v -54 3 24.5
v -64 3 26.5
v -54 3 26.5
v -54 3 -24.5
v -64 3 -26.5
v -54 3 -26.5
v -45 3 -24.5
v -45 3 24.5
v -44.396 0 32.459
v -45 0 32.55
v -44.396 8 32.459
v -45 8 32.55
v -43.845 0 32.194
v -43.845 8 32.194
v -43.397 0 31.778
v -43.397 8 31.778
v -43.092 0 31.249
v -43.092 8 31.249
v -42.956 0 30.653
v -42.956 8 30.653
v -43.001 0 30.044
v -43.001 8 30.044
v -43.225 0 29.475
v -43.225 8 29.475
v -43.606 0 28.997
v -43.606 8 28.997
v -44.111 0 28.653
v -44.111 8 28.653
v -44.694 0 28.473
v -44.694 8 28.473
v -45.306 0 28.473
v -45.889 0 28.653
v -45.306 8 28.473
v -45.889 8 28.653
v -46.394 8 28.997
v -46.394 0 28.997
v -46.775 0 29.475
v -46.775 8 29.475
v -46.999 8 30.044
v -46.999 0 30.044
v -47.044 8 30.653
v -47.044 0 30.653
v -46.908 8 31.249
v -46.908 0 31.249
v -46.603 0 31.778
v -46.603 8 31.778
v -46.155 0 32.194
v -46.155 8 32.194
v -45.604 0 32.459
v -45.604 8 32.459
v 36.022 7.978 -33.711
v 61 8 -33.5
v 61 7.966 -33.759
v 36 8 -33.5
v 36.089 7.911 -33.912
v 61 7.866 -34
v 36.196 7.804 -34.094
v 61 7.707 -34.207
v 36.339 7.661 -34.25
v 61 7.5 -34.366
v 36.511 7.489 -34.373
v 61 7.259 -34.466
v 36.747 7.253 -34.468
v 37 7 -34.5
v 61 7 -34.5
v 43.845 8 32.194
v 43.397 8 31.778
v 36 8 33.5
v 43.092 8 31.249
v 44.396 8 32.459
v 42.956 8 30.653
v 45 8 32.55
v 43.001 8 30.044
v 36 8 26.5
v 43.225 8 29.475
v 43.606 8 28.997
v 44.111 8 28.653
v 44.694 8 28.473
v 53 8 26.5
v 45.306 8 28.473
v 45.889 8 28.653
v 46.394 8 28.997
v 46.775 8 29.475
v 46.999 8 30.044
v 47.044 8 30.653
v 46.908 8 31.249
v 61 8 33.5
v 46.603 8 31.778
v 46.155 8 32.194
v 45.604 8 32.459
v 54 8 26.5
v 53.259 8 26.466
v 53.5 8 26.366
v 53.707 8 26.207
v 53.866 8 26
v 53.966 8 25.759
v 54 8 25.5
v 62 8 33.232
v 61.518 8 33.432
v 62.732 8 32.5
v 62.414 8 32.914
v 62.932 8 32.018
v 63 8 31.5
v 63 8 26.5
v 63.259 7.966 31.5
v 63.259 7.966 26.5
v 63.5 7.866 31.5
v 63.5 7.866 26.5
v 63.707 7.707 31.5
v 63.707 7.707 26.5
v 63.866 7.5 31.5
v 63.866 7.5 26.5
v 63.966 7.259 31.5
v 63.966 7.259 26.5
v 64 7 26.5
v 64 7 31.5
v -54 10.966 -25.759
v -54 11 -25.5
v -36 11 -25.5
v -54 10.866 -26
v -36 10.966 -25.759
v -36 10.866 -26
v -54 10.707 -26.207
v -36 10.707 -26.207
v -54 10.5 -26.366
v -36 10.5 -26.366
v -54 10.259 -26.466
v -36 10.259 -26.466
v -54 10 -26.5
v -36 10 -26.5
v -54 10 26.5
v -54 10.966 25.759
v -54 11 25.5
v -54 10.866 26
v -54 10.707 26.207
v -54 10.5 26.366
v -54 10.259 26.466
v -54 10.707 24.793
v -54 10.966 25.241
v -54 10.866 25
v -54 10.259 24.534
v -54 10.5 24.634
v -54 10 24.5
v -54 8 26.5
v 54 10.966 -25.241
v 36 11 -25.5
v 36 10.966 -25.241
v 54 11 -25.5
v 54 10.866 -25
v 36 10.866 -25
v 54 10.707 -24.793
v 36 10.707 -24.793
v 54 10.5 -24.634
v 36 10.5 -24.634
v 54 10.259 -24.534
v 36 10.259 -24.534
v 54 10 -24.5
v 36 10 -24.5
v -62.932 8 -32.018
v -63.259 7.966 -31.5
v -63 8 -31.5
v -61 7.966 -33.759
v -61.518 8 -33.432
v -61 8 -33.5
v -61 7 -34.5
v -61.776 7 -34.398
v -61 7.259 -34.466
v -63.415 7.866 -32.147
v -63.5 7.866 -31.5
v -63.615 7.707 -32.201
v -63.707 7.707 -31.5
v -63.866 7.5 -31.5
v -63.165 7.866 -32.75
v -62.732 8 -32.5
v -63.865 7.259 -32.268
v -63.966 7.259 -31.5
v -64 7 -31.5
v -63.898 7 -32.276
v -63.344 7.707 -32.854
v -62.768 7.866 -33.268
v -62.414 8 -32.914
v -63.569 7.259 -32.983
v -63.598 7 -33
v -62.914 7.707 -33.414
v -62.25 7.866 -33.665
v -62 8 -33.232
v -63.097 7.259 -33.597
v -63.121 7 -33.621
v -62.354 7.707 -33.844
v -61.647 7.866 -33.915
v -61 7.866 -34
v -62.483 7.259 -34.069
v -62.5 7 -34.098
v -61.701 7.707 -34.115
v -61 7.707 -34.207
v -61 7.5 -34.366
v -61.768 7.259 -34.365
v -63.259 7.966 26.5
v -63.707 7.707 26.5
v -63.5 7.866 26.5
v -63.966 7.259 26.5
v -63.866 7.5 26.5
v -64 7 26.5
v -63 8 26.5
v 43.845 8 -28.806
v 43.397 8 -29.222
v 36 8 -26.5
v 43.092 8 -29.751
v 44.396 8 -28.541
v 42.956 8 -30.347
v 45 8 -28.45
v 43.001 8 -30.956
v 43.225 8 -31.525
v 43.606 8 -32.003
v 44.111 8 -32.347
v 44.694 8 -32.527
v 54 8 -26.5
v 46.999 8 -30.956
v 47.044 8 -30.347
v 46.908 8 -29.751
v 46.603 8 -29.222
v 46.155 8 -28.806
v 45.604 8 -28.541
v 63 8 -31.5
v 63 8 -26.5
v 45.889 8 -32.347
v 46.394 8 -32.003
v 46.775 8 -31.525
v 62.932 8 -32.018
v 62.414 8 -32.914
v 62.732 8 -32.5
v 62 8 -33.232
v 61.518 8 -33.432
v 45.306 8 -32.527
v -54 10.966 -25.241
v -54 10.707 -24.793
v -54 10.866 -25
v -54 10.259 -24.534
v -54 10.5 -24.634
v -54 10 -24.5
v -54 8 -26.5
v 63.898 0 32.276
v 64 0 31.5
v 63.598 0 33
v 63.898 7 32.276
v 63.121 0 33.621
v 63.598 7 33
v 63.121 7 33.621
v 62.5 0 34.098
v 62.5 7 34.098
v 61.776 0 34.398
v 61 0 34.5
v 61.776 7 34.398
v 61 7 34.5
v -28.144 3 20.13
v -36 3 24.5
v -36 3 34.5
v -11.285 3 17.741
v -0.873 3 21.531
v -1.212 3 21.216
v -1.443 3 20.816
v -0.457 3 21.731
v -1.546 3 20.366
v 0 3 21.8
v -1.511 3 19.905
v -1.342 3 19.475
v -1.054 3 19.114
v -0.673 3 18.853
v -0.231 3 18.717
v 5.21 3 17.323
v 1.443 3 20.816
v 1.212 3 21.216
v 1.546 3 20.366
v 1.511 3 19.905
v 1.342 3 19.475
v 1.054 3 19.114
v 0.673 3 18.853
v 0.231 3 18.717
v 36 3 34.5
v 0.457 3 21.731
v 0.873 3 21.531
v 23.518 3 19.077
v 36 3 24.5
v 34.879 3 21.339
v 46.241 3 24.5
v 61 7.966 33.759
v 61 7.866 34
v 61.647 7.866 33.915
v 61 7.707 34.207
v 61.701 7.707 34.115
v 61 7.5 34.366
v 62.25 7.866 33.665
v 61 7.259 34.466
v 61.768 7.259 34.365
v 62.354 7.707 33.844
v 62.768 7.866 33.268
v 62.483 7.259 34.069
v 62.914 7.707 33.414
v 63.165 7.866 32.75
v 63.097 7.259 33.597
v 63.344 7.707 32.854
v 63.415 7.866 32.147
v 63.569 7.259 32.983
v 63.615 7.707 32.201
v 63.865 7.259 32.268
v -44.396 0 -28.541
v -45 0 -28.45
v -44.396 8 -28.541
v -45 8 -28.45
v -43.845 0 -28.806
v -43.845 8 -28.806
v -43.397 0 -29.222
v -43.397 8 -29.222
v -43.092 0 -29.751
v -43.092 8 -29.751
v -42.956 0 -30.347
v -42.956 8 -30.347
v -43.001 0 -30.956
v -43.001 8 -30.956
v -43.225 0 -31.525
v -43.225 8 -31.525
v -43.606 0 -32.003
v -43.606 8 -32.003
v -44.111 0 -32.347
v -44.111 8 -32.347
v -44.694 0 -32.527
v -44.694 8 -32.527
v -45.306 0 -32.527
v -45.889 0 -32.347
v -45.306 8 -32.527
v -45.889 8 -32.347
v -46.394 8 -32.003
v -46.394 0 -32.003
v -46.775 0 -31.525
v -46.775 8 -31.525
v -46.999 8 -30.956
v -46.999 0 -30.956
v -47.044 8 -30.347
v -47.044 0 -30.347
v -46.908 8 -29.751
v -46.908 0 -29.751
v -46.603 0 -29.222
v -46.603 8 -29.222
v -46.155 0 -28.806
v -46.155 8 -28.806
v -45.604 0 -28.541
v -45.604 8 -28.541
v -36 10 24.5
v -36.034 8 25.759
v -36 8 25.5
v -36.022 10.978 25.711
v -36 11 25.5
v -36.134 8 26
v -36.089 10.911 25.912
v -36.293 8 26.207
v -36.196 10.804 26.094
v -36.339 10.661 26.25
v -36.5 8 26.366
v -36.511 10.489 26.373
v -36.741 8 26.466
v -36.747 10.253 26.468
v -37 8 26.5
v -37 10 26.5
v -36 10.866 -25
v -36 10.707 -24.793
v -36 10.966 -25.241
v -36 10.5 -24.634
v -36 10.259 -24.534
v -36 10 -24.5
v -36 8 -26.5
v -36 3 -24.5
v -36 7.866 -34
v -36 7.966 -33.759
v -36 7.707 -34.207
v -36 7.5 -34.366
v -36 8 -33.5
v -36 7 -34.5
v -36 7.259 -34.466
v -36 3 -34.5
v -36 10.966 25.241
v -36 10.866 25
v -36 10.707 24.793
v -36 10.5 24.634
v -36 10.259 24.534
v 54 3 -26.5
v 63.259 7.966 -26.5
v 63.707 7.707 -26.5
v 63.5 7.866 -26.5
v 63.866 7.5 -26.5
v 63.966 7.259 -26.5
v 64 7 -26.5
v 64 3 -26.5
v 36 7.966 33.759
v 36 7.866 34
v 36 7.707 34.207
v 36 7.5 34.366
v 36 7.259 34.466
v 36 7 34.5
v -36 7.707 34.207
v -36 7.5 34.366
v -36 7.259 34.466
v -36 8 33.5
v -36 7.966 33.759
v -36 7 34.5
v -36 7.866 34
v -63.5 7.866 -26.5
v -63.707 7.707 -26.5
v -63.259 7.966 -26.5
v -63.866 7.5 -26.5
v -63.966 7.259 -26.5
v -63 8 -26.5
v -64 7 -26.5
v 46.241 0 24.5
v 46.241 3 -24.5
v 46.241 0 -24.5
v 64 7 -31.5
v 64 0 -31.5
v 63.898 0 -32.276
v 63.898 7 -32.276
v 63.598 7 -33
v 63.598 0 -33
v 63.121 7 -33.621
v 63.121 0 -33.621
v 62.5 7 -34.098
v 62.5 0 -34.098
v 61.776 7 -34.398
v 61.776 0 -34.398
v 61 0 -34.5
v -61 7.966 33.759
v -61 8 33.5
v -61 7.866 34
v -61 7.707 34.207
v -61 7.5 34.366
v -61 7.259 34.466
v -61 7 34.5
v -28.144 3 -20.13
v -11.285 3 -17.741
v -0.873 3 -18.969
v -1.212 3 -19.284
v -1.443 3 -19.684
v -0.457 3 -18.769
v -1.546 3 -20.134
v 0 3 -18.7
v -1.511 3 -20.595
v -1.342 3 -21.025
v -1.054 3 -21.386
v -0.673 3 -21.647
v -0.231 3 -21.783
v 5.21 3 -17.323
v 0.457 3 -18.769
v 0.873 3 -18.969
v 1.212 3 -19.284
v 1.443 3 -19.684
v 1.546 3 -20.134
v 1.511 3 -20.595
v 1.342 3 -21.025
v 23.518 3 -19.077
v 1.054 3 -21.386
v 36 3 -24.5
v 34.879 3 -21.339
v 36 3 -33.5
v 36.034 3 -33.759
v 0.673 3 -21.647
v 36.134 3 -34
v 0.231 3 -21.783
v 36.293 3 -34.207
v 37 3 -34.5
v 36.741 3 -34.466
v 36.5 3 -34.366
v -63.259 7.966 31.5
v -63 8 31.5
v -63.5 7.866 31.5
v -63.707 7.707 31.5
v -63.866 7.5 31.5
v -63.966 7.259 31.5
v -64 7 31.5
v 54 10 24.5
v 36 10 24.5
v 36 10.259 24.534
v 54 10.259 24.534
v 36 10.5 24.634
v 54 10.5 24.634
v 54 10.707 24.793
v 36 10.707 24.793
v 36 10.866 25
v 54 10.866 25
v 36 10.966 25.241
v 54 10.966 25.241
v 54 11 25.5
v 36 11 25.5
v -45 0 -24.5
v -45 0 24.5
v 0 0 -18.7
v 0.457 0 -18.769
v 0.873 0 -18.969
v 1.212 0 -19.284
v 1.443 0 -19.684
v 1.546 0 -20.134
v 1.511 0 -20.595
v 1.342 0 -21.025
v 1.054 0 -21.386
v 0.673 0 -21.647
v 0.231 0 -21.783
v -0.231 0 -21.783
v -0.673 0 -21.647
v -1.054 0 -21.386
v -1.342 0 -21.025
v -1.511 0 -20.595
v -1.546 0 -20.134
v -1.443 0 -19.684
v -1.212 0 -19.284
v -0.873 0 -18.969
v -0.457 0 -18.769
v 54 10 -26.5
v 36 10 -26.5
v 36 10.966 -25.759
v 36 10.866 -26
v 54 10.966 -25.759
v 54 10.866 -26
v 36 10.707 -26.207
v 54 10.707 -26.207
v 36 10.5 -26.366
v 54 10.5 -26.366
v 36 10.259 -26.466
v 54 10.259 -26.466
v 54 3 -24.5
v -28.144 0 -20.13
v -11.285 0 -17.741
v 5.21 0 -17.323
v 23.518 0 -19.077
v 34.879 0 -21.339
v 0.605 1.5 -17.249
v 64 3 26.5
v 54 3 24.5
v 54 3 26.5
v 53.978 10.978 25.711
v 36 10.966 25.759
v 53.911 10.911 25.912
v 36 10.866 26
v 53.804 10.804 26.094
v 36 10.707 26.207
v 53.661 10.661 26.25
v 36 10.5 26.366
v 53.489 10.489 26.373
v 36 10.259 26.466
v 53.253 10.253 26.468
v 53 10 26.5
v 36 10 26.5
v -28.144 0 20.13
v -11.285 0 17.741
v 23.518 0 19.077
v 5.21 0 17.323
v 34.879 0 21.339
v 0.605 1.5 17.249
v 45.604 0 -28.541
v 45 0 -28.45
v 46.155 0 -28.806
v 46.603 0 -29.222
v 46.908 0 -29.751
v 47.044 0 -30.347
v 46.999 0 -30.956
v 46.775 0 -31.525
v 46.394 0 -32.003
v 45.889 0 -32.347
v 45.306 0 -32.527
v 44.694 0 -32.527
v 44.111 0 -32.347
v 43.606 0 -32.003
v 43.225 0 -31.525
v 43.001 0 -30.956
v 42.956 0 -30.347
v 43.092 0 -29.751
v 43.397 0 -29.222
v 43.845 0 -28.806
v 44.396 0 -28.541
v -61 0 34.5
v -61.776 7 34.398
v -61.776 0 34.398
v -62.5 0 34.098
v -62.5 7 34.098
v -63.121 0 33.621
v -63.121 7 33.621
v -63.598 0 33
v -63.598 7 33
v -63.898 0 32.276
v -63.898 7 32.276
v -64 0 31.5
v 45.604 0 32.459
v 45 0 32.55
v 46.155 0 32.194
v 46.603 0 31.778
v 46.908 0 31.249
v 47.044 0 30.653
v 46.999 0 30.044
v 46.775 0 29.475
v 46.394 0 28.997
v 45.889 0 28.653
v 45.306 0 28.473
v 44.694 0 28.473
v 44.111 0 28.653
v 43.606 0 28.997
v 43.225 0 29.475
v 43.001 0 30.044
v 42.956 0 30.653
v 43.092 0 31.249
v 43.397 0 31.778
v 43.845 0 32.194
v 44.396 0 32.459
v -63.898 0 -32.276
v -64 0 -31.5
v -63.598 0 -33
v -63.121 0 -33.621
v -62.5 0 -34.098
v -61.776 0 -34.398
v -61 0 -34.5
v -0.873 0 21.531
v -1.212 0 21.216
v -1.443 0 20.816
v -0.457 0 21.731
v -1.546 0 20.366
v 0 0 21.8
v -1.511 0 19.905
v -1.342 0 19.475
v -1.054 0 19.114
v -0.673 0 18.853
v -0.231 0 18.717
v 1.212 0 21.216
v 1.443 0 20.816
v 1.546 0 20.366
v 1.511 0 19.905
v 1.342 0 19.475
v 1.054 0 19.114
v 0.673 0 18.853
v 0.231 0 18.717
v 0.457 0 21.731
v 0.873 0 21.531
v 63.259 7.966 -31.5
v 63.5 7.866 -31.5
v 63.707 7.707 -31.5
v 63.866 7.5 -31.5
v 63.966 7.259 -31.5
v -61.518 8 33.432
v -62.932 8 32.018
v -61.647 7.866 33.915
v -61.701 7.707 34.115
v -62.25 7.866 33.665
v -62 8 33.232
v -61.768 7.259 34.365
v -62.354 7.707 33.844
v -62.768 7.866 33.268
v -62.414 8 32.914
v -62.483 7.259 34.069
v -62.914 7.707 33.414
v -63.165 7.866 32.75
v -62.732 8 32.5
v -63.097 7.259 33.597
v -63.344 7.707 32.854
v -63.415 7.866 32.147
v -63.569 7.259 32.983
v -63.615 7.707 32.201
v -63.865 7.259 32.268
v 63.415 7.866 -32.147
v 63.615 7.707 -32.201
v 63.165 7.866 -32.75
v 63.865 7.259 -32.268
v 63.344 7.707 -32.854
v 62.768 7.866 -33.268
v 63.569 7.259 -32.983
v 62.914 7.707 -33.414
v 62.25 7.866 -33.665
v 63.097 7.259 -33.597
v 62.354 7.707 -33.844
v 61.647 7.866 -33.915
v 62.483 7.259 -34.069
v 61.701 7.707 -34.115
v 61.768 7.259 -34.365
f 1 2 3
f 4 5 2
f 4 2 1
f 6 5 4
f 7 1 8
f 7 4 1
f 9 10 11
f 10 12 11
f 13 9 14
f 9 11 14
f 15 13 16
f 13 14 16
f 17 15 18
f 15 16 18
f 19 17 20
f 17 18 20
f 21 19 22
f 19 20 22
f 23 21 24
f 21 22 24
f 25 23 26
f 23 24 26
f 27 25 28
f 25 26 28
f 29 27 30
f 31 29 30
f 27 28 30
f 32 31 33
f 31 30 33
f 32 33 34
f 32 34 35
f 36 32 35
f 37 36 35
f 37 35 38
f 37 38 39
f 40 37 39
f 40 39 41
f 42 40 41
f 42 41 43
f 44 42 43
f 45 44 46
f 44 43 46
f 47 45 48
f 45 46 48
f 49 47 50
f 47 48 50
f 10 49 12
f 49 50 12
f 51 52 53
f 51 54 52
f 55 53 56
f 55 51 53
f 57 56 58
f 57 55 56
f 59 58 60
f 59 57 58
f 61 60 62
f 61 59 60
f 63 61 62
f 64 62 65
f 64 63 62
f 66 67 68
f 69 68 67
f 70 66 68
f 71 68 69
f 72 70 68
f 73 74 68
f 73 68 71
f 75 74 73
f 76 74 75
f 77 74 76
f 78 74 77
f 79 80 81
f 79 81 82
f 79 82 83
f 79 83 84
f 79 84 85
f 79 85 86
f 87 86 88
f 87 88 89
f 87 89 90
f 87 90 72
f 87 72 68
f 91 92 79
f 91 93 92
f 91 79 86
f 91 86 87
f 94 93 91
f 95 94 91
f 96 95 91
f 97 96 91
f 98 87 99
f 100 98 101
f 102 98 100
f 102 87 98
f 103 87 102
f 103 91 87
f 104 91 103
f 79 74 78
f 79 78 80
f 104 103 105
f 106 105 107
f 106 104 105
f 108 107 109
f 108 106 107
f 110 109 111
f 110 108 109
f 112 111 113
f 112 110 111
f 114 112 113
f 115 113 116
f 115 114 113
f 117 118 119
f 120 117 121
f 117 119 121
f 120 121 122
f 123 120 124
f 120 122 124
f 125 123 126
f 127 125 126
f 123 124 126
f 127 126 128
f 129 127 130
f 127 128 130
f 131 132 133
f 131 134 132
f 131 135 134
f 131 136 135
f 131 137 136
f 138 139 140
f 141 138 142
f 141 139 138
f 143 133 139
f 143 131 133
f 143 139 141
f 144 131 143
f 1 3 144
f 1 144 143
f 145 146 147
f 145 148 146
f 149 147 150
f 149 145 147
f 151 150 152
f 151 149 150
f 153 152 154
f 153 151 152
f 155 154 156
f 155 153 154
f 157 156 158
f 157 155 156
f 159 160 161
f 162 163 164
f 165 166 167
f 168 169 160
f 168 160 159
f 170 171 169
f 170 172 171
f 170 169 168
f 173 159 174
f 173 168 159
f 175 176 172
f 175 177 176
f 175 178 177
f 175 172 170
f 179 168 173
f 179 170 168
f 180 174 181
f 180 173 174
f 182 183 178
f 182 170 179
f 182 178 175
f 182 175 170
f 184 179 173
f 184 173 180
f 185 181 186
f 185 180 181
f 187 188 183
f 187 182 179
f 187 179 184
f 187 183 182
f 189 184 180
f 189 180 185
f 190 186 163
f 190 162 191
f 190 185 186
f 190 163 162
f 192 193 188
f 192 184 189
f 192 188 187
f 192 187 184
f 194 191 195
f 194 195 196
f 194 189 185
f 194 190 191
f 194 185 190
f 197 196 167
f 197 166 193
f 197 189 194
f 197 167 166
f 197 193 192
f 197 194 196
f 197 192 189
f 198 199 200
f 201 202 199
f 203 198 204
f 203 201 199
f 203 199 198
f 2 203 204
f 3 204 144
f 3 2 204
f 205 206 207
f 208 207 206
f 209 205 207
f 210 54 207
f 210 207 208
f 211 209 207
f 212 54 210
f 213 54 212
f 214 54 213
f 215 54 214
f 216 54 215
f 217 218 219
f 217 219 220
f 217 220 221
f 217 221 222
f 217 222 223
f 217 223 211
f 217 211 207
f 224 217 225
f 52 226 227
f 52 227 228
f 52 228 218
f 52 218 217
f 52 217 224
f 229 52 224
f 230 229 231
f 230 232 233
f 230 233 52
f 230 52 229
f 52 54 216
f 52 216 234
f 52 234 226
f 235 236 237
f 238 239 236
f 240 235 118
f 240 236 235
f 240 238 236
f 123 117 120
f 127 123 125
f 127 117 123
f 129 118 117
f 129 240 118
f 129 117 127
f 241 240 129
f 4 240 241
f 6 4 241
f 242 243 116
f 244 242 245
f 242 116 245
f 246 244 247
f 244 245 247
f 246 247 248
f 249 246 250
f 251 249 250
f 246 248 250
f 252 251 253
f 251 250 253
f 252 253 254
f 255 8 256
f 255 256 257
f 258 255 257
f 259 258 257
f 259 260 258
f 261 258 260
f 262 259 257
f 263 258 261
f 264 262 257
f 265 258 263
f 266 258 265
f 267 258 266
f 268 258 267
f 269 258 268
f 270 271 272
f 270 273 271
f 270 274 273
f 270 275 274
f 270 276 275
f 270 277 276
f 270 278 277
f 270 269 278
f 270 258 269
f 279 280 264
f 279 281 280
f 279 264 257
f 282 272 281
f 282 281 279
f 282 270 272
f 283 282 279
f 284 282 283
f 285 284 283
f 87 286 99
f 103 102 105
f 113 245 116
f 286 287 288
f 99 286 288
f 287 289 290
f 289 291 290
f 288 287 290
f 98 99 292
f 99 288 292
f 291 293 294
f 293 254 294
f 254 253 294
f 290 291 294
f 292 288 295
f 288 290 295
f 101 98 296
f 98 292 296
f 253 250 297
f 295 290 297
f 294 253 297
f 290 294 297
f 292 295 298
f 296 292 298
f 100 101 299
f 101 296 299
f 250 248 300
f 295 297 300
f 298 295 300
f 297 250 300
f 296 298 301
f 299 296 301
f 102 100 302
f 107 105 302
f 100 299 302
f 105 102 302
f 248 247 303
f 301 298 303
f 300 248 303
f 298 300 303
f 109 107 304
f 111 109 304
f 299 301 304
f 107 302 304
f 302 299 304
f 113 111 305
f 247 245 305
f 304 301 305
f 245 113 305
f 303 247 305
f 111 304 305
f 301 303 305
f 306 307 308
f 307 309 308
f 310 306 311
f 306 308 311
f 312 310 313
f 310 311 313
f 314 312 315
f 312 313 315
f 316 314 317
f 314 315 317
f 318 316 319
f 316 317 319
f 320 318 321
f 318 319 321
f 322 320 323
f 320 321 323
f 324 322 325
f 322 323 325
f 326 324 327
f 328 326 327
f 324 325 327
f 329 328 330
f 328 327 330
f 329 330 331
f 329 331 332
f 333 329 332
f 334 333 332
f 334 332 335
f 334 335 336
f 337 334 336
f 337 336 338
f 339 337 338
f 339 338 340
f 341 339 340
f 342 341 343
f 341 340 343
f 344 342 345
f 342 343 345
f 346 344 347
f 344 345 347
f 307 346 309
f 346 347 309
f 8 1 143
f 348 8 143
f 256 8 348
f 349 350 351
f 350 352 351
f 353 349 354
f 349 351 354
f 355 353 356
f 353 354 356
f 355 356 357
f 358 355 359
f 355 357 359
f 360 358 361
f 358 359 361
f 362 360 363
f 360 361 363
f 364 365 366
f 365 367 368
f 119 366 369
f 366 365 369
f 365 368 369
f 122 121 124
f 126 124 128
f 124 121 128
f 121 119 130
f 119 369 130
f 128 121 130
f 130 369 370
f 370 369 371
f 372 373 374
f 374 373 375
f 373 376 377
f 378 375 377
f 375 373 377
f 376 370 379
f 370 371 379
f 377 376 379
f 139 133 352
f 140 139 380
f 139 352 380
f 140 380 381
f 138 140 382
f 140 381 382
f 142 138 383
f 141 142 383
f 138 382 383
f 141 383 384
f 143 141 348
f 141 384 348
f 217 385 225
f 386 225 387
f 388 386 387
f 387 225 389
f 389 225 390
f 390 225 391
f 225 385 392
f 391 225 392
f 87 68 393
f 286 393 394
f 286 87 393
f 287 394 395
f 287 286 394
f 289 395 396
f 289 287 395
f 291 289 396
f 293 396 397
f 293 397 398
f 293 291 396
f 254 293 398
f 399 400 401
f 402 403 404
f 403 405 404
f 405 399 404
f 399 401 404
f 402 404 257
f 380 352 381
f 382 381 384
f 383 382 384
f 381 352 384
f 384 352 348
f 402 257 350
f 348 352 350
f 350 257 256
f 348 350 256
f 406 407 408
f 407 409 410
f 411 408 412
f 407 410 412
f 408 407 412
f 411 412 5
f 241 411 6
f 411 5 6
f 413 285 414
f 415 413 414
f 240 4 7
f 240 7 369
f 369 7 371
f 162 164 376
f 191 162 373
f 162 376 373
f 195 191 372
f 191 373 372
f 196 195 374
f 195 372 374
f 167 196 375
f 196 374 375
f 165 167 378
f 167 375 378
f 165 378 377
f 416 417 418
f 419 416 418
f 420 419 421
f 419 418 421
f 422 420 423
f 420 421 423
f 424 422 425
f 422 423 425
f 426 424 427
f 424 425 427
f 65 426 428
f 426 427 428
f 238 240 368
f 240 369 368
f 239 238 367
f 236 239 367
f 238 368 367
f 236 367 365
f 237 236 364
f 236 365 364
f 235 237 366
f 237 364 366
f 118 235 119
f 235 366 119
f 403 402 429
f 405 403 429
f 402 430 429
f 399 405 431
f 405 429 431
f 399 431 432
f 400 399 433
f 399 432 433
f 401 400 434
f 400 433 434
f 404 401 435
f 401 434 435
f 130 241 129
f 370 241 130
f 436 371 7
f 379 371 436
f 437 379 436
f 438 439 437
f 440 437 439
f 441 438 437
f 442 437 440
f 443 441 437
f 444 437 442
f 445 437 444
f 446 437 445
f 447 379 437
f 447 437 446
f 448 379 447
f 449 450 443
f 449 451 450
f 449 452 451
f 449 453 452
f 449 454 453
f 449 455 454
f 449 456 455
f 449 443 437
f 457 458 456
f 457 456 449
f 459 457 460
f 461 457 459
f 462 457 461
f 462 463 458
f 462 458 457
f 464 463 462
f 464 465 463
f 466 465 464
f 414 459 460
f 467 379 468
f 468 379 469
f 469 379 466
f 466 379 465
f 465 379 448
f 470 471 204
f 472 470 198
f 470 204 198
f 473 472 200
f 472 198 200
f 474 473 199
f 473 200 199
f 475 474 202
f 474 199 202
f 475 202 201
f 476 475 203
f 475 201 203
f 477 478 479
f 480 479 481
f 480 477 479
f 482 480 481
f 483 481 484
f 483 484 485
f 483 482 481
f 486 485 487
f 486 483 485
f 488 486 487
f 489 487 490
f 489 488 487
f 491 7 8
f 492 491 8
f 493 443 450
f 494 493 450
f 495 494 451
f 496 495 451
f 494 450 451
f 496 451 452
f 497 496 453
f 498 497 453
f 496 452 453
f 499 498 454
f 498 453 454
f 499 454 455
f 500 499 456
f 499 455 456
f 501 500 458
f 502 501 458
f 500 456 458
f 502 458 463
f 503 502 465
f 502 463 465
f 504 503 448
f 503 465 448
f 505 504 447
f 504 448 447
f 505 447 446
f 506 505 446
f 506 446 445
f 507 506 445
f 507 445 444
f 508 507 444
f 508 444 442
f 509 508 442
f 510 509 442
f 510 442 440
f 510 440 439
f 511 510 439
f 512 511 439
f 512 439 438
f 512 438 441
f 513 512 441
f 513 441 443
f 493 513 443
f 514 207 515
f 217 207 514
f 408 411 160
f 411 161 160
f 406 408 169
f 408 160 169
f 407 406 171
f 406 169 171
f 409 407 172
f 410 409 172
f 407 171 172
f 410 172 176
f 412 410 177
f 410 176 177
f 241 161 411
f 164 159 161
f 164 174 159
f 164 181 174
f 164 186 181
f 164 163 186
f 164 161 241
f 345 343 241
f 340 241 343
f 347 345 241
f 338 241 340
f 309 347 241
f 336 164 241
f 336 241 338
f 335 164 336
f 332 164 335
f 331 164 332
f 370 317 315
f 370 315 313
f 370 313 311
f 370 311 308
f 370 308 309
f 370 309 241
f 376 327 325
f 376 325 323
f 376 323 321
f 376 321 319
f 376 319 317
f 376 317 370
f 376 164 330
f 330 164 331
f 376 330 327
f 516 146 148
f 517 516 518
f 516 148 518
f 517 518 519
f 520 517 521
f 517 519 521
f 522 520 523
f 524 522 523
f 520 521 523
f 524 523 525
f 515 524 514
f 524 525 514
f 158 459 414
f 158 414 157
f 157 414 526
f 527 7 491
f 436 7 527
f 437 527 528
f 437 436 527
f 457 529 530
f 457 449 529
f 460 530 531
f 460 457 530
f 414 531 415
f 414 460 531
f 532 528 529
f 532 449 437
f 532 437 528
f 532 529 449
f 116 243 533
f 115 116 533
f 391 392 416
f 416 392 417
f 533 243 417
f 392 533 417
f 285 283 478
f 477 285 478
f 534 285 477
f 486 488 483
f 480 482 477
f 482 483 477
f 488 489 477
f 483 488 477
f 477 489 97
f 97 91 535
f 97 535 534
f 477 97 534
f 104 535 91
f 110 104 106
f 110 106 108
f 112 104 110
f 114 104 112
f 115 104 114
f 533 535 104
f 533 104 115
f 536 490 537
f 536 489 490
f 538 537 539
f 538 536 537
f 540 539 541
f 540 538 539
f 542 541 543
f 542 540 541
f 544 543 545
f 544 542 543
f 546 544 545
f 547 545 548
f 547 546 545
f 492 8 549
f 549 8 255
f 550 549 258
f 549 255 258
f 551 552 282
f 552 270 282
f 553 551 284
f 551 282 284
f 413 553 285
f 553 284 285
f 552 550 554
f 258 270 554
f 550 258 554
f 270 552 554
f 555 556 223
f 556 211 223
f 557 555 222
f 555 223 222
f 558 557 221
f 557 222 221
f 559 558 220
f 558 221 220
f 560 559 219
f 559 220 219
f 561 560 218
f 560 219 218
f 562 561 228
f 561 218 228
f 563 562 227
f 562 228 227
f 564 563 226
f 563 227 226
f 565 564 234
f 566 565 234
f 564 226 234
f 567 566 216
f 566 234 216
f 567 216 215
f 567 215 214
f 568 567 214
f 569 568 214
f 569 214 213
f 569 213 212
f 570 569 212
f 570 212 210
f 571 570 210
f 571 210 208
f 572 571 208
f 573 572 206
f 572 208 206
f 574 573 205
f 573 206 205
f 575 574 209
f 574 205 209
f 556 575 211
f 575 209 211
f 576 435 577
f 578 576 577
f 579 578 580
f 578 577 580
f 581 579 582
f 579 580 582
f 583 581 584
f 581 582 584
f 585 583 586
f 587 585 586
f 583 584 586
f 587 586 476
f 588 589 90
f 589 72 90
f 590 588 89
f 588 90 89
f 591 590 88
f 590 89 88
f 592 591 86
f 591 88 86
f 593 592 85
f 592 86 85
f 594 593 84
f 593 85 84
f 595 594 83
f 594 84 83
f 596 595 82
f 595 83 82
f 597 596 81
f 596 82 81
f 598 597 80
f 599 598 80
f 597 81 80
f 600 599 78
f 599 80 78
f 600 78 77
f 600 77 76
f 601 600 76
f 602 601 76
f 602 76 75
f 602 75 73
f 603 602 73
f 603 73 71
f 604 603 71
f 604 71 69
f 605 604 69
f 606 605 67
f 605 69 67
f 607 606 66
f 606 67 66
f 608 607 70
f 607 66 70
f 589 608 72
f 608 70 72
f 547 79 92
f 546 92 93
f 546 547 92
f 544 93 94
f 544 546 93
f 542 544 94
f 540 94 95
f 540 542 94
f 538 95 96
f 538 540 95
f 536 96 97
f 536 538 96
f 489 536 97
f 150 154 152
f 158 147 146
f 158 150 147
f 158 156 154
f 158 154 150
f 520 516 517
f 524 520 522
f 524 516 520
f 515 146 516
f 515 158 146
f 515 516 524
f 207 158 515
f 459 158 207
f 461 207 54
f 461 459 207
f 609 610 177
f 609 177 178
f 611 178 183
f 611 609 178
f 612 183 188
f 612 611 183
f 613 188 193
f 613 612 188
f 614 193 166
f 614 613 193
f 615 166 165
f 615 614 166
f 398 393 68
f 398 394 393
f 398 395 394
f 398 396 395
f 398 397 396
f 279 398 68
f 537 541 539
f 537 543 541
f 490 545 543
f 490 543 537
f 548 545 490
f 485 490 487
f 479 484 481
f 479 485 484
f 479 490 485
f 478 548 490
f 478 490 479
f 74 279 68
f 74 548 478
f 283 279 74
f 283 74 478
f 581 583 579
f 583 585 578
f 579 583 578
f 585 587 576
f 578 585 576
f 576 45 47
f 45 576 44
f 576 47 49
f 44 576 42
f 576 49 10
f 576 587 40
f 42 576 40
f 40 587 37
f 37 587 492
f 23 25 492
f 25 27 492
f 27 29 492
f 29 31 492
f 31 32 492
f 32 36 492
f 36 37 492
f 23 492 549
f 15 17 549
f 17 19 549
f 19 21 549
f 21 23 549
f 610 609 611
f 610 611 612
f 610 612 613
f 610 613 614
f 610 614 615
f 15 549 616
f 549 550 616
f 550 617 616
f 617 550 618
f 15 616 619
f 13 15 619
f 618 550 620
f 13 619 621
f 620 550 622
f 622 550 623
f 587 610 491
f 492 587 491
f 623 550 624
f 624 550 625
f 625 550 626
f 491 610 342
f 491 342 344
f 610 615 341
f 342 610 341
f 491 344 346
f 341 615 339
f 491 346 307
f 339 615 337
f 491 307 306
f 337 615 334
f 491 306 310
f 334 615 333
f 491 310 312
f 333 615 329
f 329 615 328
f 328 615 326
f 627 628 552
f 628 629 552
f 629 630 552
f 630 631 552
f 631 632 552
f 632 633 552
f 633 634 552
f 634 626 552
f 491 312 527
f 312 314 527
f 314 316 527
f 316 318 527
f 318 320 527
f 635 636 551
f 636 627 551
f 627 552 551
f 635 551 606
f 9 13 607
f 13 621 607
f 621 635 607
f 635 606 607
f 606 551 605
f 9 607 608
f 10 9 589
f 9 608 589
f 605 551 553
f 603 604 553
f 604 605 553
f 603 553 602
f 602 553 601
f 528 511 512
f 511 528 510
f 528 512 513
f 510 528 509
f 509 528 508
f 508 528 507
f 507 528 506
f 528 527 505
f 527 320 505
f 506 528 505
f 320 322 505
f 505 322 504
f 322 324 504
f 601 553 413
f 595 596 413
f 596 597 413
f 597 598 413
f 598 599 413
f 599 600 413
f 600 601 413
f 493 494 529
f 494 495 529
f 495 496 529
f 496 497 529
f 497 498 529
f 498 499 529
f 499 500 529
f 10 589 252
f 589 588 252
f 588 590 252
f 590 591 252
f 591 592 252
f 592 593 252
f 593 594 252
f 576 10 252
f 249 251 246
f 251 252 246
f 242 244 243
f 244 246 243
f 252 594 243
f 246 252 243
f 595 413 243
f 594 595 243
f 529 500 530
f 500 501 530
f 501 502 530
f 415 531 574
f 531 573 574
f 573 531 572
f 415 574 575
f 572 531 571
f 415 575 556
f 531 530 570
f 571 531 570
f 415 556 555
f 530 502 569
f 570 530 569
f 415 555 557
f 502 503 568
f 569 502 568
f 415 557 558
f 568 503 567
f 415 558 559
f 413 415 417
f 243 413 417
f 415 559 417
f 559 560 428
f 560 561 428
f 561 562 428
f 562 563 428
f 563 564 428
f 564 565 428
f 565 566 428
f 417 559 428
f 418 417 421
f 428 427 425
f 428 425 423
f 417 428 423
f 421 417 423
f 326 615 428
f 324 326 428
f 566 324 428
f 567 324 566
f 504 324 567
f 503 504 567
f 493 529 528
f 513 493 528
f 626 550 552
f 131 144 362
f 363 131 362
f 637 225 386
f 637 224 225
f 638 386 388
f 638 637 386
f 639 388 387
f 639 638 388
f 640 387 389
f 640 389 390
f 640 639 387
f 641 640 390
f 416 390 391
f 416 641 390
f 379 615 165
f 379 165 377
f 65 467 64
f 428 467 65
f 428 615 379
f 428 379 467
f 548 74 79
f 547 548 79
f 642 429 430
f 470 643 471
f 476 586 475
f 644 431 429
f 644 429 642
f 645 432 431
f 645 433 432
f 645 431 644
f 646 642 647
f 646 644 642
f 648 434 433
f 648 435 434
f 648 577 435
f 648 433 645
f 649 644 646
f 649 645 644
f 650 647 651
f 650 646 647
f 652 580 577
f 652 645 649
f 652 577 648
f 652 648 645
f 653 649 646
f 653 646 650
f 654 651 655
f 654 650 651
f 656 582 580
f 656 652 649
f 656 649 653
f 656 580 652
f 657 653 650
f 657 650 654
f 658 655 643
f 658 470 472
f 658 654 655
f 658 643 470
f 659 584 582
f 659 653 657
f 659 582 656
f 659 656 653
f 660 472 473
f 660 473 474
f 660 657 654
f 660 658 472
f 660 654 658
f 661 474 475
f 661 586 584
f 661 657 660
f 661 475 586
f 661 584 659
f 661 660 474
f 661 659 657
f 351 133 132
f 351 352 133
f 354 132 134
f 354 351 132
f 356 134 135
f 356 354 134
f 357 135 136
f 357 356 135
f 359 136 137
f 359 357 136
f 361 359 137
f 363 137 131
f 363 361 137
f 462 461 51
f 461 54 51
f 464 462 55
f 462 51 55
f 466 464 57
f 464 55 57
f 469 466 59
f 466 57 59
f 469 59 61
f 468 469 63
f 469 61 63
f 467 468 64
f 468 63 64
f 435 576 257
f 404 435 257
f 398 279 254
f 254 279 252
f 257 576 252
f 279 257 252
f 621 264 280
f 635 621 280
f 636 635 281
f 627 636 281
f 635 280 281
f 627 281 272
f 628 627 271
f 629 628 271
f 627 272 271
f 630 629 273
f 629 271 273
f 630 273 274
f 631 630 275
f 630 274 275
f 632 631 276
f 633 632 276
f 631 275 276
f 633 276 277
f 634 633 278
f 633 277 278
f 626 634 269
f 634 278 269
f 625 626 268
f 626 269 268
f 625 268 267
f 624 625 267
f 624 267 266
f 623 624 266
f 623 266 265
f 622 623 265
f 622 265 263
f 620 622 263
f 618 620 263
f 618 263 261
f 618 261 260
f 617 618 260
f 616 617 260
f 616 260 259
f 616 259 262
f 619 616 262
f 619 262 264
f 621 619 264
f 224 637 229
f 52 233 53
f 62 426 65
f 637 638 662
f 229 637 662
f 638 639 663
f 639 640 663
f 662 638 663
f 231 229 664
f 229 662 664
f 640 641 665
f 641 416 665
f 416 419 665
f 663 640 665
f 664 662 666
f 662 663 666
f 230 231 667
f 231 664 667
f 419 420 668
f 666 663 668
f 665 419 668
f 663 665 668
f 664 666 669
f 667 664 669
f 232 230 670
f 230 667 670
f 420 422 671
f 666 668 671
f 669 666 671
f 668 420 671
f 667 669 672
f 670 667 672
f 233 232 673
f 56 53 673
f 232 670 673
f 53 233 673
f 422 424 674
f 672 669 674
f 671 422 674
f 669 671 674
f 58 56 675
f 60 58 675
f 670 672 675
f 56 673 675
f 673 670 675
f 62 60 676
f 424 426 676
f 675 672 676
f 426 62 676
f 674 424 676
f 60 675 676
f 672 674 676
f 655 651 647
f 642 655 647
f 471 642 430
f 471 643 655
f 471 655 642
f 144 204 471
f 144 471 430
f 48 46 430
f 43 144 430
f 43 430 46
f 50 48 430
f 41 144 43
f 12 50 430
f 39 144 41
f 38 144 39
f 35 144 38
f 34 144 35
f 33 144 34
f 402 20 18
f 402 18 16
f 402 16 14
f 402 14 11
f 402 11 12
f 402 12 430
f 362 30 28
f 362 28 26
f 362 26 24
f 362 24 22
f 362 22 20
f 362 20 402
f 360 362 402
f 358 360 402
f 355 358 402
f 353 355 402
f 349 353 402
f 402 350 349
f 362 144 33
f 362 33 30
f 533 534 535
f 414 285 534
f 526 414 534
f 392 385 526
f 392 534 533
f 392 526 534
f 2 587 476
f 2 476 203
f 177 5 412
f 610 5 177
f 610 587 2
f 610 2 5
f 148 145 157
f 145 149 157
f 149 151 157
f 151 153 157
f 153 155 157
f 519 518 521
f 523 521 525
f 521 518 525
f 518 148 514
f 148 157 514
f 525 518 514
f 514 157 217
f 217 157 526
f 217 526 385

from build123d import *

# Parameters (mm, degrees)
SKETCH1_W                      = 128
SKETCH1_H                      = 69
BOSS_EXTRUDE1_DEPTH            = 3
SKETCH5_R                      = 1.55
CUT_EXTRUDE5_DEPTH             = 10
SKETCH7_W                      = 28
SKETCH7_H                      = 8
BOSS_EXTRUDE2_DEPTH            = 5
SKETCH2_R                      = 2.05
CUT_EXTRUDE6_DEPTH             = 73.878323252
CUT_EXTRUDE6_DIRECTION_2_REACH = 74.878
CUT_EXTRUDE7_DEPTH             = 3
SKETCH8_W                      = 18
SKETCH8_H                      = 2
BOSS_EXTRUDE3_DEPTH            = 8
FILLET1_R                      = 3
FILLET2_R                      = 1


with BuildPart() as part:
    # Sketch1 → Boss-Extrude1 (new body)
    with BuildSketch(Plane(origin=(0, 0, 0), x_dir=(1, 0, 0), z_dir=(0, 1, 0))):
        Rectangle(SKETCH1_W, SKETCH1_H)
    extrude(amount=BOSS_EXTRUDE1_DEPTH)

    # Sketch5 → Cut-Extrude5 (cut)
    with BuildSketch(Plane(origin=(0, 3, 0), x_dir=(1, 0, 0), z_dir=(0, 1, 0))):
        with Locations(Location((0, -20.25, 0), (0, 0, 270))):
            Circle(SKETCH5_R)
        with Locations(Location((0, 20.25, 0), (0, 0, 270))):
            Circle(SKETCH5_R)
    extrude(amount=-CUT_EXTRUDE5_DEPTH, mode=Mode.SUBTRACT)

    # Sketch7 → Boss-Extrude2 (add)
    with BuildSketch(Plane(origin=(0, 3, 0), x_dir=(1, 0, 0), z_dir=(0, 1, 0))):
        with Locations((-50, 30.5)):
            Rectangle(SKETCH7_W, SKETCH7_H)
        with Locations((50, 30.5)):
            Rectangle(SKETCH7_W, SKETCH7_H)
        with Locations((50, -30.5)):
            Rectangle(SKETCH7_W, SKETCH7_H)
        with Locations((-50, -30.5)):
            Rectangle(SKETCH7_W, SKETCH7_H)
    extrude(amount=BOSS_EXTRUDE2_DEPTH)

    # Sketch2 → Cut-Extrude6 (cut)
    with BuildSketch(Plane(origin=(0, 3, 0), x_dir=(1, 0, 0), z_dir=(0, 1, 0))):
        with Locations(Location((-45, 30.5, 0), (0, 0, 270))):
            Circle(SKETCH2_R)
        with Locations(Location((45, 30.5, 0), (0, 0, 270))):
            Circle(SKETCH2_R)
        with Locations(Location((45, -30.5, 0), (0, 0, 270))):
            Circle(SKETCH2_R)
        with Locations(Location((-45, -30.5, 0), (0, 0, 270))):
            Circle(SKETCH2_R)
    extrude(amount=-CUT_EXTRUDE6_DEPTH, mode=Mode.SUBTRACT)

    # Sketch2 → Cut-Extrude6 direction 2 (cut, up to next)
    with BuildSketch(Plane(origin=(0, 3, 0), x_dir=(1, 0, 0), z_dir=(0, 1, 0)), mode=Mode.PRIVATE) as cut_extrude6_direction_2_sk1:
        with Locations(Location((-45, 30.5, 0), (0, 0, 270))):
            Circle(SKETCH2_R)
    cut_extrude6_direction_2_tool1 = extrude(cut_extrude6_direction_2_sk1.sketch, amount=CUT_EXTRUDE6_DIRECTION_2_REACH, mode=Mode.PRIVATE) & part.part
    # Sketch2 → Cut-Extrude6 direction 2 (cut, up to next)
    with BuildSketch(Plane(origin=(0, 3, 0), x_dir=(1, 0, 0), z_dir=(0, 1, 0)), mode=Mode.PRIVATE) as cut_extrude6_direction_2_sk2:
        with Locations(Location((45, 30.5, 0), (0, 0, 270))):
            Circle(SKETCH2_R)
    cut_extrude6_direction_2_tool2 = extrude(cut_extrude6_direction_2_sk2.sketch, amount=CUT_EXTRUDE6_DIRECTION_2_REACH, mode=Mode.PRIVATE) & part.part
    # Sketch2 → Cut-Extrude6 direction 2 (cut, up to next)
    with BuildSketch(Plane(origin=(0, 3, 0), x_dir=(1, 0, 0), z_dir=(0, 1, 0)), mode=Mode.PRIVATE) as cut_extrude6_direction_2_sk3:
        with Locations(Location((45, -30.5, 0), (0, 0, 270))):
            Circle(SKETCH2_R)
    cut_extrude6_direction_2_tool3 = extrude(cut_extrude6_direction_2_sk3.sketch, amount=CUT_EXTRUDE6_DIRECTION_2_REACH, mode=Mode.PRIVATE) & part.part
    # Sketch2 → Cut-Extrude6 direction 2 (cut, up to next)
    with BuildSketch(Plane(origin=(0, 3, 0), x_dir=(1, 0, 0), z_dir=(0, 1, 0)), mode=Mode.PRIVATE) as cut_extrude6_direction_2_sk4:
        with Locations(Location((-45, -30.5, 0), (0, 0, 270))):
            Circle(SKETCH2_R)
    cut_extrude6_direction_2_tool4 = extrude(cut_extrude6_direction_2_sk4.sketch, amount=CUT_EXTRUDE6_DIRECTION_2_REACH, mode=Mode.PRIVATE) & part.part
    add(cut_extrude6_direction_2_tool1.solids().sort_by_distance((-45, 3, -30.5))[0], mode=Mode.SUBTRACT)
    add(cut_extrude6_direction_2_tool2.solids().sort_by_distance((45, 3, -30.5))[0], mode=Mode.SUBTRACT)
    add(cut_extrude6_direction_2_tool3.solids().sort_by_distance((45, 3, 30.5))[0], mode=Mode.SUBTRACT)
    add(cut_extrude6_direction_2_tool4.solids().sort_by_distance((-45, 3, 30.5))[0], mode=Mode.SUBTRACT)

    # Sketch6 → Cut-Extrude7 (cut)
    with BuildSketch(Plane(origin=(0, 3, 0), x_dir=(1, 0, 0), z_dir=(0, 1, 0))):
        with BuildLine():
            Line((-45, 24.5), (-45, -24.5))
            add(Edge.make_bspline(
                [(-45, -24.5), (0.589986909, -9.997447075), (46.241142194, -24.5)],
                knots=[0, 0, 0, 1, 1, 1], degree=2))
            Line((46.241142194, -24.5), (46.241142194, 24.5))
            add(Edge.make_bspline(
                [(-45, 24.5), (0.589986909, 9.997447075), (46.241142194, 24.5)],
                knots=[0, 0, 0, 1, 1, 1], degree=2))
        make_face()
    extrude(amount=-CUT_EXTRUDE7_DEPTH, mode=Mode.SUBTRACT)

    # Sketch8 → Boss-Extrude3 (add)
    with BuildSketch(Plane(origin=(0, 3, 0), x_dir=(1, 0, 0), z_dir=(0, 1, 0))):
        with Locations((-45, 25.5)):
            Rectangle(SKETCH8_W, SKETCH8_H)
        with Locations((-45, -25.5)):
            Rectangle(SKETCH8_W, SKETCH8_H)
        with Locations((45, -25.5)):
            Rectangle(SKETCH8_W, SKETCH8_H)
        with Locations((45, 25.5)):
            Rectangle(SKETCH8_W, SKETCH8_H)
    extrude(amount=BOSS_EXTRUDE3_DEPTH)

    # Fillet1
    fillet1_edges = [part.edges().sort_by_distance(p)[0] for p in [
        (64, 4, 34.5),
        (-64, 4, 34.5),
        (-64, 4, -34.5),
        (64, 4, -34.5),
    ]]
    fillet(fillet1_edges, radius=FILLET1_R)

    # Fillet2
    fillet2_edges = [part.edges().sort_by_distance(p)[0] for p in [
        (64, 8, -29),
        (63.121320344, 8, -33.621320344),
        (48.5, 8, -34.5),
        (36, 5.5, -34.5),
        (45, 11, -24.5),
        (45, 11, -26.5),
        (45, 11, 26.5),
        (45, 11, 24.5),
        (-45, 11, 26.5),
        (-45, 11, 24.5),
        (-45, 11, -24.5),
        (-45, 11, -26.5),
        (-64, 8, -29),
        (-63.121320344, 8, -33.621320344),
        (-64, 8, 29),
        (-63.121320344, 8, 33.621320344),
        (48.5, 8, 34.5),
        (63.121320344, 8, 33.621320344),
        (-48.5, 8, -34.5),
        (-48.5, 8, 34.5),
        (-36, 9.5, 26.5),
        (54, 9.5, 26.5),
        (64, 8, 29),
    ]]
    fillet(fillet2_edges, radius=FILLET2_R - 0.0001)  # a hair under: the kernel refuses the full size


solid = part.part
